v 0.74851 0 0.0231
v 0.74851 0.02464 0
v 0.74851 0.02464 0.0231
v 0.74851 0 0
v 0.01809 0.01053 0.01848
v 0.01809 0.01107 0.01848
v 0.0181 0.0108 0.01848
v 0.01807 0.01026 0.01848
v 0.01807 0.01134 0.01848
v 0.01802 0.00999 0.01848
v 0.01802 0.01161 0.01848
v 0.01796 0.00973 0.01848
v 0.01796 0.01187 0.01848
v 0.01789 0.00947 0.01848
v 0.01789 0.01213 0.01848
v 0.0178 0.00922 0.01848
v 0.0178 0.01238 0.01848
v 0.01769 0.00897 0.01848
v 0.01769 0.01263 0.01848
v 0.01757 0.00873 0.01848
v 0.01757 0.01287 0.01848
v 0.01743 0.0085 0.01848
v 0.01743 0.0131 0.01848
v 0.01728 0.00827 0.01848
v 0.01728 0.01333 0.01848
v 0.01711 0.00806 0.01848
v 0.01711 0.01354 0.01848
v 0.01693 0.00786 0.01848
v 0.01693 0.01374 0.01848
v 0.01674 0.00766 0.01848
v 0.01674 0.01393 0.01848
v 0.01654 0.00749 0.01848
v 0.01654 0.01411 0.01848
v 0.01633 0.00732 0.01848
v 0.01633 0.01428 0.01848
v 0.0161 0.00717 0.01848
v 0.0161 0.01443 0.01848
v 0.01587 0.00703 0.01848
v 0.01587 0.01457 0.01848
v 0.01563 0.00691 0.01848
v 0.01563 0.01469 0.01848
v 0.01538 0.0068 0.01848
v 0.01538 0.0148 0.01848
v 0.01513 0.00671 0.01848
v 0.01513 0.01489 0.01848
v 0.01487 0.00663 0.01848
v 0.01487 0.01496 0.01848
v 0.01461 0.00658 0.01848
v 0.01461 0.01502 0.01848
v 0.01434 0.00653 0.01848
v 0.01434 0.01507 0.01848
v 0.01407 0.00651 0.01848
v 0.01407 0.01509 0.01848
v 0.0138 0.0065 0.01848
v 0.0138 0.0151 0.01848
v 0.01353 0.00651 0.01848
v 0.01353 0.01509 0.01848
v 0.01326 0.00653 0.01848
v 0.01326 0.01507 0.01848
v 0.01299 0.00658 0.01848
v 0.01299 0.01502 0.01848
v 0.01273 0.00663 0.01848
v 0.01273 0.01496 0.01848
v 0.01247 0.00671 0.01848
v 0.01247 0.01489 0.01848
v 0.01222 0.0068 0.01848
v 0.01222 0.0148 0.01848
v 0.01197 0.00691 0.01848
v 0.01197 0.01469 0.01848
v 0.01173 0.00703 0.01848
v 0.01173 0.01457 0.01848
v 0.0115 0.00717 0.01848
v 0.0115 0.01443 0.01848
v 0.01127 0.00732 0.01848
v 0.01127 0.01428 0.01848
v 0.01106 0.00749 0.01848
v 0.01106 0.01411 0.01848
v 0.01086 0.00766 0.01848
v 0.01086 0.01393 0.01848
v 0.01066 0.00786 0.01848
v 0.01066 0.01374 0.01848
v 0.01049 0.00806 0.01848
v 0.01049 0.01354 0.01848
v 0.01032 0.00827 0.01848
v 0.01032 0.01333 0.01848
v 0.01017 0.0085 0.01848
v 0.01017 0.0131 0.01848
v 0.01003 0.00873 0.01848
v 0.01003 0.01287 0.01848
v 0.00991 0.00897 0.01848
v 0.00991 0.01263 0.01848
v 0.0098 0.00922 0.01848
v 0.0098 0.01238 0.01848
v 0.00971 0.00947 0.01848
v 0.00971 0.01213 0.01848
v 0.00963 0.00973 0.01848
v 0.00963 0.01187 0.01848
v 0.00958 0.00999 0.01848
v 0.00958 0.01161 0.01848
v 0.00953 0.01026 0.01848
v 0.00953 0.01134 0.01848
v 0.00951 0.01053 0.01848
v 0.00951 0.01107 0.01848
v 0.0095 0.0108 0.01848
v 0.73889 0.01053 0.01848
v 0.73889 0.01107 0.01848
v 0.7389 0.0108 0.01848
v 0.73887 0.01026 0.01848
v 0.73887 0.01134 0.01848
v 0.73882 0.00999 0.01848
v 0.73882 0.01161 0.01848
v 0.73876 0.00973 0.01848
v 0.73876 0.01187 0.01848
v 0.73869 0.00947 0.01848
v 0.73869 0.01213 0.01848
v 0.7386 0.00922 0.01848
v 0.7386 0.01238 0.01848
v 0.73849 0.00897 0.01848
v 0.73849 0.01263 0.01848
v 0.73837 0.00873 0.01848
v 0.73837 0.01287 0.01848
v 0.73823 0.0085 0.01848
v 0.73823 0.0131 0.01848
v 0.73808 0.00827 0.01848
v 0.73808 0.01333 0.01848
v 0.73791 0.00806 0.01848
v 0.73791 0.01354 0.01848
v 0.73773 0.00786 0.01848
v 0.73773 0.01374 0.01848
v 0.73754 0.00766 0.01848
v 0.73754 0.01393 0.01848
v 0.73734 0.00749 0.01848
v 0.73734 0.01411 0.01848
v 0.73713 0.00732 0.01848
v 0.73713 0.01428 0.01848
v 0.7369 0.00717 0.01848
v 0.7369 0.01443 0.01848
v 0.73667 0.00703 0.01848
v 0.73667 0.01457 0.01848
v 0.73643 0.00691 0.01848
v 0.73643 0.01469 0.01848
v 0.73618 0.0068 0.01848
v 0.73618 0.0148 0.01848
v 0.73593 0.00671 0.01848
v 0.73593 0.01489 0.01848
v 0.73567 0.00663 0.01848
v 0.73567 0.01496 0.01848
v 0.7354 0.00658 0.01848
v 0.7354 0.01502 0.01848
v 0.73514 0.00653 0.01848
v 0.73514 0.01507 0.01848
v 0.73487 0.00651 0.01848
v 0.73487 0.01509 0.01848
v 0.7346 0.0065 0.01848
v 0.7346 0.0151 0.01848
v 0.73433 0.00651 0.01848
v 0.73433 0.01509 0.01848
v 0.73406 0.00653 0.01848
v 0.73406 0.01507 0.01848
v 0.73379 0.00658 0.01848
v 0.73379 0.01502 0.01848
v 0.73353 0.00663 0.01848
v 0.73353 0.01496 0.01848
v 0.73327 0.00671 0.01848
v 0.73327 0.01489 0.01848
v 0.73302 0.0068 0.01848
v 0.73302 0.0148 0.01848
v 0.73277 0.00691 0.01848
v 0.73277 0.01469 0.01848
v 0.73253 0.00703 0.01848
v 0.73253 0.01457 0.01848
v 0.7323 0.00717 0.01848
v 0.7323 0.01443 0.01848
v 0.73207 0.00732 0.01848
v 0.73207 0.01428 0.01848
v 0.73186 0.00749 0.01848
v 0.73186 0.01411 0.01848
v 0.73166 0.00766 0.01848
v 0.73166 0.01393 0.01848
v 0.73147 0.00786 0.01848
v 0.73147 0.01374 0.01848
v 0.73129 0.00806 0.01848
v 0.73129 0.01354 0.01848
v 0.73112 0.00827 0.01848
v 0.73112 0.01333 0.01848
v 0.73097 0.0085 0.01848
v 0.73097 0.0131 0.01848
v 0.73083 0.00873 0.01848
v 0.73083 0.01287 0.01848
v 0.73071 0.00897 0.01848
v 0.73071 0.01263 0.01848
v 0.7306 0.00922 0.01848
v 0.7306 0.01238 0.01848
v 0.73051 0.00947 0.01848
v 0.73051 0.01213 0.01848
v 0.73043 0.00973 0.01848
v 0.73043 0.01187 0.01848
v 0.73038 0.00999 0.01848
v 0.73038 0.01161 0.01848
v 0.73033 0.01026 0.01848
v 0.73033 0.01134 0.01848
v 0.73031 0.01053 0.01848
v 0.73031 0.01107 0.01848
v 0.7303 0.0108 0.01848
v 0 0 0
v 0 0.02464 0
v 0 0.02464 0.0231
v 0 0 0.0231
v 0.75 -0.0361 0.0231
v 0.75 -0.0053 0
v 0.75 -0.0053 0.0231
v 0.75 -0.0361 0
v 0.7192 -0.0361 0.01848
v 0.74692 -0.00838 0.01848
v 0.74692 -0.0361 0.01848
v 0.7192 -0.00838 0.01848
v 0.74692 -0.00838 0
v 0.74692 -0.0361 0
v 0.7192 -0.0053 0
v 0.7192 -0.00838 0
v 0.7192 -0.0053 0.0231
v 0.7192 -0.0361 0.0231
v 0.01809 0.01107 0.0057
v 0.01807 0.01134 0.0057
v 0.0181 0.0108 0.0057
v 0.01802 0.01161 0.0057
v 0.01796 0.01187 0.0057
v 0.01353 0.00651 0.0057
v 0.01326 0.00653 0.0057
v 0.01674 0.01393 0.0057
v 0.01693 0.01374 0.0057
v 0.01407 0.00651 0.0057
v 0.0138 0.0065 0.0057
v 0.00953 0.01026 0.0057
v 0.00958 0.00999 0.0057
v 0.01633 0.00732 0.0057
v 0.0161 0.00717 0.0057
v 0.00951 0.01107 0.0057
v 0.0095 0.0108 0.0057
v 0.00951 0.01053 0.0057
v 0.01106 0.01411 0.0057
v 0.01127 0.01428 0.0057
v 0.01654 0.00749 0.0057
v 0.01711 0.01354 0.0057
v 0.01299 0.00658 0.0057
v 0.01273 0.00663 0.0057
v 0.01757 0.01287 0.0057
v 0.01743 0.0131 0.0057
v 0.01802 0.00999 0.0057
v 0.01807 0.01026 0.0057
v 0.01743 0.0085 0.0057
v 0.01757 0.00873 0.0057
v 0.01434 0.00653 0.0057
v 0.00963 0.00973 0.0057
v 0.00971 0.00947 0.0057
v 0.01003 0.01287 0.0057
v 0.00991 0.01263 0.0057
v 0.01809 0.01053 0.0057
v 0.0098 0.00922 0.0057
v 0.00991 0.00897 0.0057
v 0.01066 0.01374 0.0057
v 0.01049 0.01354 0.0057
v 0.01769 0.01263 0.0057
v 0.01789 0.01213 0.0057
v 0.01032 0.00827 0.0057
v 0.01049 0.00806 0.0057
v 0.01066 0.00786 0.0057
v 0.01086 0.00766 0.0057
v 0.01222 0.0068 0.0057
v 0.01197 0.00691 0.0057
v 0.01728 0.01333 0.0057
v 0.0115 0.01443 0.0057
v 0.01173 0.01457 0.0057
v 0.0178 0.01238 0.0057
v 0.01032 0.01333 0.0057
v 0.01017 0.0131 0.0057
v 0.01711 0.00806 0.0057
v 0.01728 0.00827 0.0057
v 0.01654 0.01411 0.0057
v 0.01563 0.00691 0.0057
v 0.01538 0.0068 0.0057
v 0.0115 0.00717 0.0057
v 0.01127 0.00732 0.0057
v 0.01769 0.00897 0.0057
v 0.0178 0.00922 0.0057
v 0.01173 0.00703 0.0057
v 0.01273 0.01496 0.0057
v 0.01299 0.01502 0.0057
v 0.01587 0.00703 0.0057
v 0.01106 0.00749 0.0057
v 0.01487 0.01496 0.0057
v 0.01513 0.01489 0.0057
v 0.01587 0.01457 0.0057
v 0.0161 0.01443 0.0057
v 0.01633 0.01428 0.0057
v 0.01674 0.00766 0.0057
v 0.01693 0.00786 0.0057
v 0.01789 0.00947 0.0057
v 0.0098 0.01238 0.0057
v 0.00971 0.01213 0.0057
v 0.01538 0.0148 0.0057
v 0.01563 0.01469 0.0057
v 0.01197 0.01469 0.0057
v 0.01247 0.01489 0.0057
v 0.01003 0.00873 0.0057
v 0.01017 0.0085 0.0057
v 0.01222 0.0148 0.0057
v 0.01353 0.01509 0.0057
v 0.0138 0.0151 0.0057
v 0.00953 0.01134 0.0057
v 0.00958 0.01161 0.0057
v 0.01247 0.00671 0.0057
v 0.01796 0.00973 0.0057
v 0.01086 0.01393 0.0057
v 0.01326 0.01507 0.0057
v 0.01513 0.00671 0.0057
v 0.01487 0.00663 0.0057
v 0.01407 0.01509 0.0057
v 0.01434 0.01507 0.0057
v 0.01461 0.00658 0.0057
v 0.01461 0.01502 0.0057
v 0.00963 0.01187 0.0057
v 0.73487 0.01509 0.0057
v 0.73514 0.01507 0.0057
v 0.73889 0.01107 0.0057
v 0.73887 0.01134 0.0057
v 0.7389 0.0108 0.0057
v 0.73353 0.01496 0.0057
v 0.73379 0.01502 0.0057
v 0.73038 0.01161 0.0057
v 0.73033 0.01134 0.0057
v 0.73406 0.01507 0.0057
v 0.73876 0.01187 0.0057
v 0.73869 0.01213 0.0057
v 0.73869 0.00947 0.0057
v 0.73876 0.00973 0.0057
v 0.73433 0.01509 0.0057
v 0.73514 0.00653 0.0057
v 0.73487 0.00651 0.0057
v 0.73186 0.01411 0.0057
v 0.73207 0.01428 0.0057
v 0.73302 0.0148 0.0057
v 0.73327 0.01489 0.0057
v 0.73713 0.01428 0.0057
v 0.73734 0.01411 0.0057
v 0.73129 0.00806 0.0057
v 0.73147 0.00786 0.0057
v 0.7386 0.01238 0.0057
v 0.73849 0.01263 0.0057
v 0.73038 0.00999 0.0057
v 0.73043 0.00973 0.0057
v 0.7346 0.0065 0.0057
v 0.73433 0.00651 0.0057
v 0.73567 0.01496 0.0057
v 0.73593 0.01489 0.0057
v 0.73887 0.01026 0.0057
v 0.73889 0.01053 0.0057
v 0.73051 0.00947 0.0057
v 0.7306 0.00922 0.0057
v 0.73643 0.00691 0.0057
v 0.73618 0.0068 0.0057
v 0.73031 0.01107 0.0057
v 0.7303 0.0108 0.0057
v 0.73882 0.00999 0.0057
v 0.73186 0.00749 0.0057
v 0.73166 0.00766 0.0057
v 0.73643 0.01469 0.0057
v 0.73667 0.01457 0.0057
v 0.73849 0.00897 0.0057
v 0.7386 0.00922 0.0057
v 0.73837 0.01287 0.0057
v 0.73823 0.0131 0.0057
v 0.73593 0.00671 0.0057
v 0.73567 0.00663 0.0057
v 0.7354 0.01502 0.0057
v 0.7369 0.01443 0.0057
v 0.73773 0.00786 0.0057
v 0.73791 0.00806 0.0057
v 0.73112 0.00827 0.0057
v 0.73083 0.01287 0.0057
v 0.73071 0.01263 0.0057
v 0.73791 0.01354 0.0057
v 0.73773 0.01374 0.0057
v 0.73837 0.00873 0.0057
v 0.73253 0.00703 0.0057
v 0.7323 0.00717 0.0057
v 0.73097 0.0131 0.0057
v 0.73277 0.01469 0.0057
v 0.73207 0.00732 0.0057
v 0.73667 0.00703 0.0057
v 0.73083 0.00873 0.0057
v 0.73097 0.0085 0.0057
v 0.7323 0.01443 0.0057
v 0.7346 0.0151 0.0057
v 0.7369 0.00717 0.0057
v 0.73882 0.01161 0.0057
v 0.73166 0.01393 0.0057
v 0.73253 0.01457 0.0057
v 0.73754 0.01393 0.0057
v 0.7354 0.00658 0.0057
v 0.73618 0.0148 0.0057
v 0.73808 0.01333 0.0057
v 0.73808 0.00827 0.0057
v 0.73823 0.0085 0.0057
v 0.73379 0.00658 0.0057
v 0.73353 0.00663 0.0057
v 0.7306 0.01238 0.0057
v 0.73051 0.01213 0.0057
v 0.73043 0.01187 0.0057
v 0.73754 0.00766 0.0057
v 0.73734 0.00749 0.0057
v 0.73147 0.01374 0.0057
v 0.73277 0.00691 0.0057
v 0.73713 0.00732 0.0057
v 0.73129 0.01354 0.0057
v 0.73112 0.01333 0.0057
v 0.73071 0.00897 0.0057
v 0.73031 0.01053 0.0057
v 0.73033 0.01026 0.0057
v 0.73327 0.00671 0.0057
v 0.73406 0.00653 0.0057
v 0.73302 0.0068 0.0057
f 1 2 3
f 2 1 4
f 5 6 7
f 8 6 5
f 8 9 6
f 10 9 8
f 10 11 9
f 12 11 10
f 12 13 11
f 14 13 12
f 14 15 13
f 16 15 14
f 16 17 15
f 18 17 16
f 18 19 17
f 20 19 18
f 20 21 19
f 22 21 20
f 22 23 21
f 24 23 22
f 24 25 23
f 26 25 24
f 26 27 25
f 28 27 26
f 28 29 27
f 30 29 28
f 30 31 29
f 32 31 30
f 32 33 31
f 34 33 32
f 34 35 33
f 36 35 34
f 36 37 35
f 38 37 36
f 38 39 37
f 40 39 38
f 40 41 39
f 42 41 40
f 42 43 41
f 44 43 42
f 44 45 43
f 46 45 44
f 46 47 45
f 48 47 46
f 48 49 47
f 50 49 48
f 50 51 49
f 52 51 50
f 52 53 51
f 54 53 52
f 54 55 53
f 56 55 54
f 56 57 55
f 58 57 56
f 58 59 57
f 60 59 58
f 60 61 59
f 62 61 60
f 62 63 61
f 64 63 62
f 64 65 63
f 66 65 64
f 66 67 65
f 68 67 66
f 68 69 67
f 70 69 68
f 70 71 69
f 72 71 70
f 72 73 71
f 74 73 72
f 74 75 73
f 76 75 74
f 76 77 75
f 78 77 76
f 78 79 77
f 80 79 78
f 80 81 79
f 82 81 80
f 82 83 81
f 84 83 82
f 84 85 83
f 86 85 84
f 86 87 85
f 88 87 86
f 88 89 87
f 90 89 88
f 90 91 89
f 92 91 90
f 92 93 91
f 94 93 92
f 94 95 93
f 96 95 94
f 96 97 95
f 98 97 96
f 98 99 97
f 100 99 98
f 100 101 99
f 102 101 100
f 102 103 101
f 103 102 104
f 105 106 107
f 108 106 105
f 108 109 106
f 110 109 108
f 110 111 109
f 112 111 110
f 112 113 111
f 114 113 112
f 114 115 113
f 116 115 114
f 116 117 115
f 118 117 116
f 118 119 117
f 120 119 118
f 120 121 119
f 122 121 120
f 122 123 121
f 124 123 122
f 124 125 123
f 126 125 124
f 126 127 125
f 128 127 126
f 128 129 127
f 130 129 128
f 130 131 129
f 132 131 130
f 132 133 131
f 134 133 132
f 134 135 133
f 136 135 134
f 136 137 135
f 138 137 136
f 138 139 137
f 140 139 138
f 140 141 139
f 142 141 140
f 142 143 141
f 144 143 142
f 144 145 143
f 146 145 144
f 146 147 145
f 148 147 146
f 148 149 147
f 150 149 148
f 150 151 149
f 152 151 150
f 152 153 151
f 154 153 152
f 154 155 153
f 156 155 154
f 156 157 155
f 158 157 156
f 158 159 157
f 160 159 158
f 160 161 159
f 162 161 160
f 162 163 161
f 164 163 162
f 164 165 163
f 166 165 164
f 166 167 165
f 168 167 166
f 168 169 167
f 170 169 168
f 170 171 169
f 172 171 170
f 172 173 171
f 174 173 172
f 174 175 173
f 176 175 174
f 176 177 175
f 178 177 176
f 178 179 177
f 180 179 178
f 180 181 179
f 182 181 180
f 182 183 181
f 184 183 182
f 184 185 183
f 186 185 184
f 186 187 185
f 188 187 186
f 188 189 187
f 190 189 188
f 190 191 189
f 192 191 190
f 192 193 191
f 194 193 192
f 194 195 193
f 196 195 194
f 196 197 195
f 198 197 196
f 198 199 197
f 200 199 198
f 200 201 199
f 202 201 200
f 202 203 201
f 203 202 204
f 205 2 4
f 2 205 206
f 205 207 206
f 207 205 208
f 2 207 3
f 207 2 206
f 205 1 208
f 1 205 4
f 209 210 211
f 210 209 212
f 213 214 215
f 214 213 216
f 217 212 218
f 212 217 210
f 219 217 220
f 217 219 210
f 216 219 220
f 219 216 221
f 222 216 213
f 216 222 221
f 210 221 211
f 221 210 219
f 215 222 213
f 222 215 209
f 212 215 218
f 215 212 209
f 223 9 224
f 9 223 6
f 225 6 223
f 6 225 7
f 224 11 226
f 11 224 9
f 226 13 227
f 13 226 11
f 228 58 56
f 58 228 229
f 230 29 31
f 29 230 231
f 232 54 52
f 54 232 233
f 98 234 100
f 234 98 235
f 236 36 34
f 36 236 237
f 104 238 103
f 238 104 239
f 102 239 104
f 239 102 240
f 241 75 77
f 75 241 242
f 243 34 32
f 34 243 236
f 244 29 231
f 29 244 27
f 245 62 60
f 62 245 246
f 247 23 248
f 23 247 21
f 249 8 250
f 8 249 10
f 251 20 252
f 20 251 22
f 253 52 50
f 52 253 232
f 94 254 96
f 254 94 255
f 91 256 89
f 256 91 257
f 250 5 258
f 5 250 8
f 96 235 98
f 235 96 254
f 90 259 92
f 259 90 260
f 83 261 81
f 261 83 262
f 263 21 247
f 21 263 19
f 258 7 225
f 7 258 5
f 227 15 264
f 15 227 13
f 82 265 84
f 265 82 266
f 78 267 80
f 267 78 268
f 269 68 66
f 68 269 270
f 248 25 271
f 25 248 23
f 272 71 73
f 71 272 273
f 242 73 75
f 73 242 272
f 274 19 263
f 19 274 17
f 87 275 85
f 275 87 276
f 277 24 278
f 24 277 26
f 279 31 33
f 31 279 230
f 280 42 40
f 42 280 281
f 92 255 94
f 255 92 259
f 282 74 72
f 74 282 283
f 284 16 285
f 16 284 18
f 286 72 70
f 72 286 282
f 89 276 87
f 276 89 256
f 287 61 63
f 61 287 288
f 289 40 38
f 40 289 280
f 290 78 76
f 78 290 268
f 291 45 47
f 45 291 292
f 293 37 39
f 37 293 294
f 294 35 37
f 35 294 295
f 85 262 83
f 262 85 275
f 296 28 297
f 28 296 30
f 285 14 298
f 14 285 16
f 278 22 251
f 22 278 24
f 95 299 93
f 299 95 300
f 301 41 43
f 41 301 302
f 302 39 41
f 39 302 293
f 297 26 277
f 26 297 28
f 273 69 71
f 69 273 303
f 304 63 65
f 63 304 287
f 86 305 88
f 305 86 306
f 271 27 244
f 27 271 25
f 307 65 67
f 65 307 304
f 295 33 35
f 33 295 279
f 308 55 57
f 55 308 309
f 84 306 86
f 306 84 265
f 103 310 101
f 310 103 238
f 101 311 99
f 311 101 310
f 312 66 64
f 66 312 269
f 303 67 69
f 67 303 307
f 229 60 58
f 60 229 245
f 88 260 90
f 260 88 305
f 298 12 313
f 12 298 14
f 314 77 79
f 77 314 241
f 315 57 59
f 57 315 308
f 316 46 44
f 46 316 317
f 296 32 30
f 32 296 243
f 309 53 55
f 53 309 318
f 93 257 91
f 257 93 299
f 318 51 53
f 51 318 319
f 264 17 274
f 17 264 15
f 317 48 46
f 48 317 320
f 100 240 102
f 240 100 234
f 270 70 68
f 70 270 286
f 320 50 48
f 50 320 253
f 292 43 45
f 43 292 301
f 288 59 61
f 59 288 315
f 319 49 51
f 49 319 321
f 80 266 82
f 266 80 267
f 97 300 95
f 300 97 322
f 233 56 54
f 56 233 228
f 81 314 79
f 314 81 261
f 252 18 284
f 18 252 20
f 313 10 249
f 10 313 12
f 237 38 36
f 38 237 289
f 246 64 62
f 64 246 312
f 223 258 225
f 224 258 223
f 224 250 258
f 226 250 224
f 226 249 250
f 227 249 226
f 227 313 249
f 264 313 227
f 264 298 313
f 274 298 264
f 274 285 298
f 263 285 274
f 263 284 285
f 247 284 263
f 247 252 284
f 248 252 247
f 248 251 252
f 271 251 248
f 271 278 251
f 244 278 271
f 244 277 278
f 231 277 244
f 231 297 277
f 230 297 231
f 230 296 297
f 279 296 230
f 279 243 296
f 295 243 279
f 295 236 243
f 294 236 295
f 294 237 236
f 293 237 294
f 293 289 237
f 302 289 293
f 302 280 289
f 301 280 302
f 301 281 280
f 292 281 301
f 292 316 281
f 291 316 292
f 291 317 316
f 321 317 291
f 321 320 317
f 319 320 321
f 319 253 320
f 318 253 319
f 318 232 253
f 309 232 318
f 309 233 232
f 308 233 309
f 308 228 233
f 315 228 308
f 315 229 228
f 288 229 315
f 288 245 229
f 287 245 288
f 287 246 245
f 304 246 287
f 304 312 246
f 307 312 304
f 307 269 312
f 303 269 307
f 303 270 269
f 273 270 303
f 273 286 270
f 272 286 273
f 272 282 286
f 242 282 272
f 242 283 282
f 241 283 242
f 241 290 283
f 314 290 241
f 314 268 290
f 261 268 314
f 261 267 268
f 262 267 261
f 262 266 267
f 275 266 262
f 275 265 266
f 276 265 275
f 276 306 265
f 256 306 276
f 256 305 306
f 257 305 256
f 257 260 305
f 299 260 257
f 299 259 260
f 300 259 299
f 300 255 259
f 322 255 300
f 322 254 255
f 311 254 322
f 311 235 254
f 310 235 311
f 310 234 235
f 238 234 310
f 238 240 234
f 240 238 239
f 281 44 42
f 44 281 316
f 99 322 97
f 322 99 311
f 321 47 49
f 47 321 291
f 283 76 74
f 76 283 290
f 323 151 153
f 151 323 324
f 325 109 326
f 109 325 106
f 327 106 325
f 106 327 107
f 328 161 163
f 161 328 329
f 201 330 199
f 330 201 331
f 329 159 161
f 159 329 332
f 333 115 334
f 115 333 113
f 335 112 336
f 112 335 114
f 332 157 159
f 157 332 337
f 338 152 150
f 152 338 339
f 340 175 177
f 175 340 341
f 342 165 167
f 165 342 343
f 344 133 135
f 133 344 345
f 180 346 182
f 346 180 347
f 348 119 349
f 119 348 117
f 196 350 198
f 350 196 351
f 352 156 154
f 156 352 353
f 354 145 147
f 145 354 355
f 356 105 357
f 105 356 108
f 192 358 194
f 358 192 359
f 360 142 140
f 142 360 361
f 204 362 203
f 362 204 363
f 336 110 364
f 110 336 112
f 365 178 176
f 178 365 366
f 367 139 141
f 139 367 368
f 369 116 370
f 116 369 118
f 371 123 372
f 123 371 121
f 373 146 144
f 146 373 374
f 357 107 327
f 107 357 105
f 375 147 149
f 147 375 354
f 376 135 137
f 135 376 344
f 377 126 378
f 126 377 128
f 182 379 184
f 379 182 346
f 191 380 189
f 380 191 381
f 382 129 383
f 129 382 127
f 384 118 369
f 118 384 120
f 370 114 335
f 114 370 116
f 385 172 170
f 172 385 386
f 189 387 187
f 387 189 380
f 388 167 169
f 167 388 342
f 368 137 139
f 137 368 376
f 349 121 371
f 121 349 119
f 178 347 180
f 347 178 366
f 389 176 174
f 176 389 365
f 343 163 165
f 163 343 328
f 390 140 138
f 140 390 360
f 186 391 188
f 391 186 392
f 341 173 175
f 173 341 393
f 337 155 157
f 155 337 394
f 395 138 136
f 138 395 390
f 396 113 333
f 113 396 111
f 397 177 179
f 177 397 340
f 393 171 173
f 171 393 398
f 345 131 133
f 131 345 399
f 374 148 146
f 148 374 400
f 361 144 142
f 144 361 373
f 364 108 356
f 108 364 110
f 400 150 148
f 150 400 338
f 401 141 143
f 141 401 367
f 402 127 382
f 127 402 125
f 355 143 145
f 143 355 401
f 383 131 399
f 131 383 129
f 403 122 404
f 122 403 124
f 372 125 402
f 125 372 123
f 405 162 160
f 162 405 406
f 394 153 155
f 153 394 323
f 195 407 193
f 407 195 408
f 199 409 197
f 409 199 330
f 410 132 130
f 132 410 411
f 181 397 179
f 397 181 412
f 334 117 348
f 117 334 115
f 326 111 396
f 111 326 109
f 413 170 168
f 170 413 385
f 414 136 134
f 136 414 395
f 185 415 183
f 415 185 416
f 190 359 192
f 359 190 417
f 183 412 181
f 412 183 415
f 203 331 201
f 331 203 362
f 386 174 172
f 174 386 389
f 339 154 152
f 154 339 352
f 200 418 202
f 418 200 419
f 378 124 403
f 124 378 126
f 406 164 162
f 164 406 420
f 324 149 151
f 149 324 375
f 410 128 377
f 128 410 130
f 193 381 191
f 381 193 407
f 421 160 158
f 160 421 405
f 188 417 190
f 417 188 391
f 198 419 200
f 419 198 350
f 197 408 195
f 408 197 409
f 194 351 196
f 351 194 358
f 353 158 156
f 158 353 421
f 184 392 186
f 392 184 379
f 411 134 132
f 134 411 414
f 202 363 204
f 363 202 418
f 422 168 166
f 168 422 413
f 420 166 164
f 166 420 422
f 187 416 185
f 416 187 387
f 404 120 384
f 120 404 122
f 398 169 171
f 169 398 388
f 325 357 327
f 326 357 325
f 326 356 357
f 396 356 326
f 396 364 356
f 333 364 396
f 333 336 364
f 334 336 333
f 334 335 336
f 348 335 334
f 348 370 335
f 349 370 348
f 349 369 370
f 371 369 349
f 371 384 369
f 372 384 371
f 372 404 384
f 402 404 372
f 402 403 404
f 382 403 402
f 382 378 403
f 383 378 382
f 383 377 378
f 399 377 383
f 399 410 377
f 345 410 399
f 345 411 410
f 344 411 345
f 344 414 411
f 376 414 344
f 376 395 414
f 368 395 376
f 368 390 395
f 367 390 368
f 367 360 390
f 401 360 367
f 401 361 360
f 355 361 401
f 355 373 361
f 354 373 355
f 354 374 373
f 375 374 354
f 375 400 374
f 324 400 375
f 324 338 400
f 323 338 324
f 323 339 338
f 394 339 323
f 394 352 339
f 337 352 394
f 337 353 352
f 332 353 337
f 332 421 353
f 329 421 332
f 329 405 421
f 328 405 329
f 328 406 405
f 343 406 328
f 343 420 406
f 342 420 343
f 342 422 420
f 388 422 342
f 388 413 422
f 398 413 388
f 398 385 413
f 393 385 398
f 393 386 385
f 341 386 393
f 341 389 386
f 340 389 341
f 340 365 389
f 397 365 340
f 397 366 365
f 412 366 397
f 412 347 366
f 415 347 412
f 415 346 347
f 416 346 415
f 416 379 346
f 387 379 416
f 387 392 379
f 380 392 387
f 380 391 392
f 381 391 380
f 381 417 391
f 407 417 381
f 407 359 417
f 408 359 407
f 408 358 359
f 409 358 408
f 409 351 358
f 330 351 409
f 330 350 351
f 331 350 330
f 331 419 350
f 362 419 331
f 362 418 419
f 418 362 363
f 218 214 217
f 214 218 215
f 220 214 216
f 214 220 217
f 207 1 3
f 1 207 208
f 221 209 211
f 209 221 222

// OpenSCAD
// ============================================
// Parametric Rail with End Block
// ============================================

// --- Main Rail Dimensions ---
rail_length       = 0.748506;   // X extent
rail_width        = 0.024642;   // Y extent
rail_lower_height = 0.018482;   // Z extent of lower solid body
top_layer_thick   = 0.00462;    // Z thickness of shallow top layer

// --- Circular Recess Parameters (common) ---
recess_r       = 0.0043;        // Recess radius
recess_z_bot   = 0.0062;        // Bottom Z of recess band
recess_y_rail  = 0.0108;        // Rail recess center Y offset from front edge
recess_x1      = 0.0138;        // First rail recess X center
recess_x2      = 0.7346;        // Second rail recess X center

// --- End Block Dimensions ---
block_size     = 0.030803;      // Equal-sided XY dimension
block_x_left   = 0.7192;        // Left edge X position
block_y_front  = -0.0361;       // Front edge Y position (in front of rail)

// --- End Block Circular Recess ---
blk_recess_x   = 0.7361;        // X center
blk_recess_y   = -0.0192;       // Y center (in front of rail front edge)

// --- End Block Rectangular Cutout ---
cutout_size    = 0.027722;       // Equal-sided XY dimension
cutout_reach   = 0.077;          // Total Z reach from upper lower-body shoulder

// --- Resolution ---
$fn = 100;

// ============================================
// Modules
// ============================================

// Circular recess: blind hole from top of lower body down to recess_z_bot
module circ_recess(cx, cy) {
    h = rail_lower_height - recess_z_bot;
    translate([cx, cy, recess_z_bot - 0.0005])
        cylinder(r = recess_r, h = h + 0.001);
}

// ============================================
// Main Assembly
// ============================================

union() {
    // --- Lower bodies with all subtractive features ---
    difference() {
        union() {
            // Step 1: Rail lower solid body
            cube([rail_length, rail_width, rail_lower_height]);

            // Step 3: End block lower solid body
            translate([block_x_left, block_y_front, 0])
                cube([block_size, block_size, rail_lower_height]);
        }

        // Step 5: Two circular recesses in the rail
        circ_recess(recess_x1, recess_y_rail);
        circ_recess(recess_x2, recess_y_rail);

        // Step 7: Circular recess in the end block
        circ_recess(blk_recess_x, blk_recess_y);

        // Step 8: Rectangular cutout in end block
        //         shares block left edge and front edge
        //         extends from top of lower body downward by cutout_reach
        translate([block_x_left, block_y_front,
                   rail_lower_height - cutout_reach])
            cube([cutout_size, cutout_size, cutout_reach + 0.001]);
    }

    // --- Top layers (preserved, unaffected by cuts) ---

    // Step 2: Rail shallow top layer
    translate([0, 0, rail_lower_height])
        cube([rail_length, rail_width, top_layer_thick]);

    // Step 4: End block shallow top layer
    translate([block_x_left, block_y_front, rail_lower_height])
        cube([block_size, block_size, top_layer_thick]);
}
